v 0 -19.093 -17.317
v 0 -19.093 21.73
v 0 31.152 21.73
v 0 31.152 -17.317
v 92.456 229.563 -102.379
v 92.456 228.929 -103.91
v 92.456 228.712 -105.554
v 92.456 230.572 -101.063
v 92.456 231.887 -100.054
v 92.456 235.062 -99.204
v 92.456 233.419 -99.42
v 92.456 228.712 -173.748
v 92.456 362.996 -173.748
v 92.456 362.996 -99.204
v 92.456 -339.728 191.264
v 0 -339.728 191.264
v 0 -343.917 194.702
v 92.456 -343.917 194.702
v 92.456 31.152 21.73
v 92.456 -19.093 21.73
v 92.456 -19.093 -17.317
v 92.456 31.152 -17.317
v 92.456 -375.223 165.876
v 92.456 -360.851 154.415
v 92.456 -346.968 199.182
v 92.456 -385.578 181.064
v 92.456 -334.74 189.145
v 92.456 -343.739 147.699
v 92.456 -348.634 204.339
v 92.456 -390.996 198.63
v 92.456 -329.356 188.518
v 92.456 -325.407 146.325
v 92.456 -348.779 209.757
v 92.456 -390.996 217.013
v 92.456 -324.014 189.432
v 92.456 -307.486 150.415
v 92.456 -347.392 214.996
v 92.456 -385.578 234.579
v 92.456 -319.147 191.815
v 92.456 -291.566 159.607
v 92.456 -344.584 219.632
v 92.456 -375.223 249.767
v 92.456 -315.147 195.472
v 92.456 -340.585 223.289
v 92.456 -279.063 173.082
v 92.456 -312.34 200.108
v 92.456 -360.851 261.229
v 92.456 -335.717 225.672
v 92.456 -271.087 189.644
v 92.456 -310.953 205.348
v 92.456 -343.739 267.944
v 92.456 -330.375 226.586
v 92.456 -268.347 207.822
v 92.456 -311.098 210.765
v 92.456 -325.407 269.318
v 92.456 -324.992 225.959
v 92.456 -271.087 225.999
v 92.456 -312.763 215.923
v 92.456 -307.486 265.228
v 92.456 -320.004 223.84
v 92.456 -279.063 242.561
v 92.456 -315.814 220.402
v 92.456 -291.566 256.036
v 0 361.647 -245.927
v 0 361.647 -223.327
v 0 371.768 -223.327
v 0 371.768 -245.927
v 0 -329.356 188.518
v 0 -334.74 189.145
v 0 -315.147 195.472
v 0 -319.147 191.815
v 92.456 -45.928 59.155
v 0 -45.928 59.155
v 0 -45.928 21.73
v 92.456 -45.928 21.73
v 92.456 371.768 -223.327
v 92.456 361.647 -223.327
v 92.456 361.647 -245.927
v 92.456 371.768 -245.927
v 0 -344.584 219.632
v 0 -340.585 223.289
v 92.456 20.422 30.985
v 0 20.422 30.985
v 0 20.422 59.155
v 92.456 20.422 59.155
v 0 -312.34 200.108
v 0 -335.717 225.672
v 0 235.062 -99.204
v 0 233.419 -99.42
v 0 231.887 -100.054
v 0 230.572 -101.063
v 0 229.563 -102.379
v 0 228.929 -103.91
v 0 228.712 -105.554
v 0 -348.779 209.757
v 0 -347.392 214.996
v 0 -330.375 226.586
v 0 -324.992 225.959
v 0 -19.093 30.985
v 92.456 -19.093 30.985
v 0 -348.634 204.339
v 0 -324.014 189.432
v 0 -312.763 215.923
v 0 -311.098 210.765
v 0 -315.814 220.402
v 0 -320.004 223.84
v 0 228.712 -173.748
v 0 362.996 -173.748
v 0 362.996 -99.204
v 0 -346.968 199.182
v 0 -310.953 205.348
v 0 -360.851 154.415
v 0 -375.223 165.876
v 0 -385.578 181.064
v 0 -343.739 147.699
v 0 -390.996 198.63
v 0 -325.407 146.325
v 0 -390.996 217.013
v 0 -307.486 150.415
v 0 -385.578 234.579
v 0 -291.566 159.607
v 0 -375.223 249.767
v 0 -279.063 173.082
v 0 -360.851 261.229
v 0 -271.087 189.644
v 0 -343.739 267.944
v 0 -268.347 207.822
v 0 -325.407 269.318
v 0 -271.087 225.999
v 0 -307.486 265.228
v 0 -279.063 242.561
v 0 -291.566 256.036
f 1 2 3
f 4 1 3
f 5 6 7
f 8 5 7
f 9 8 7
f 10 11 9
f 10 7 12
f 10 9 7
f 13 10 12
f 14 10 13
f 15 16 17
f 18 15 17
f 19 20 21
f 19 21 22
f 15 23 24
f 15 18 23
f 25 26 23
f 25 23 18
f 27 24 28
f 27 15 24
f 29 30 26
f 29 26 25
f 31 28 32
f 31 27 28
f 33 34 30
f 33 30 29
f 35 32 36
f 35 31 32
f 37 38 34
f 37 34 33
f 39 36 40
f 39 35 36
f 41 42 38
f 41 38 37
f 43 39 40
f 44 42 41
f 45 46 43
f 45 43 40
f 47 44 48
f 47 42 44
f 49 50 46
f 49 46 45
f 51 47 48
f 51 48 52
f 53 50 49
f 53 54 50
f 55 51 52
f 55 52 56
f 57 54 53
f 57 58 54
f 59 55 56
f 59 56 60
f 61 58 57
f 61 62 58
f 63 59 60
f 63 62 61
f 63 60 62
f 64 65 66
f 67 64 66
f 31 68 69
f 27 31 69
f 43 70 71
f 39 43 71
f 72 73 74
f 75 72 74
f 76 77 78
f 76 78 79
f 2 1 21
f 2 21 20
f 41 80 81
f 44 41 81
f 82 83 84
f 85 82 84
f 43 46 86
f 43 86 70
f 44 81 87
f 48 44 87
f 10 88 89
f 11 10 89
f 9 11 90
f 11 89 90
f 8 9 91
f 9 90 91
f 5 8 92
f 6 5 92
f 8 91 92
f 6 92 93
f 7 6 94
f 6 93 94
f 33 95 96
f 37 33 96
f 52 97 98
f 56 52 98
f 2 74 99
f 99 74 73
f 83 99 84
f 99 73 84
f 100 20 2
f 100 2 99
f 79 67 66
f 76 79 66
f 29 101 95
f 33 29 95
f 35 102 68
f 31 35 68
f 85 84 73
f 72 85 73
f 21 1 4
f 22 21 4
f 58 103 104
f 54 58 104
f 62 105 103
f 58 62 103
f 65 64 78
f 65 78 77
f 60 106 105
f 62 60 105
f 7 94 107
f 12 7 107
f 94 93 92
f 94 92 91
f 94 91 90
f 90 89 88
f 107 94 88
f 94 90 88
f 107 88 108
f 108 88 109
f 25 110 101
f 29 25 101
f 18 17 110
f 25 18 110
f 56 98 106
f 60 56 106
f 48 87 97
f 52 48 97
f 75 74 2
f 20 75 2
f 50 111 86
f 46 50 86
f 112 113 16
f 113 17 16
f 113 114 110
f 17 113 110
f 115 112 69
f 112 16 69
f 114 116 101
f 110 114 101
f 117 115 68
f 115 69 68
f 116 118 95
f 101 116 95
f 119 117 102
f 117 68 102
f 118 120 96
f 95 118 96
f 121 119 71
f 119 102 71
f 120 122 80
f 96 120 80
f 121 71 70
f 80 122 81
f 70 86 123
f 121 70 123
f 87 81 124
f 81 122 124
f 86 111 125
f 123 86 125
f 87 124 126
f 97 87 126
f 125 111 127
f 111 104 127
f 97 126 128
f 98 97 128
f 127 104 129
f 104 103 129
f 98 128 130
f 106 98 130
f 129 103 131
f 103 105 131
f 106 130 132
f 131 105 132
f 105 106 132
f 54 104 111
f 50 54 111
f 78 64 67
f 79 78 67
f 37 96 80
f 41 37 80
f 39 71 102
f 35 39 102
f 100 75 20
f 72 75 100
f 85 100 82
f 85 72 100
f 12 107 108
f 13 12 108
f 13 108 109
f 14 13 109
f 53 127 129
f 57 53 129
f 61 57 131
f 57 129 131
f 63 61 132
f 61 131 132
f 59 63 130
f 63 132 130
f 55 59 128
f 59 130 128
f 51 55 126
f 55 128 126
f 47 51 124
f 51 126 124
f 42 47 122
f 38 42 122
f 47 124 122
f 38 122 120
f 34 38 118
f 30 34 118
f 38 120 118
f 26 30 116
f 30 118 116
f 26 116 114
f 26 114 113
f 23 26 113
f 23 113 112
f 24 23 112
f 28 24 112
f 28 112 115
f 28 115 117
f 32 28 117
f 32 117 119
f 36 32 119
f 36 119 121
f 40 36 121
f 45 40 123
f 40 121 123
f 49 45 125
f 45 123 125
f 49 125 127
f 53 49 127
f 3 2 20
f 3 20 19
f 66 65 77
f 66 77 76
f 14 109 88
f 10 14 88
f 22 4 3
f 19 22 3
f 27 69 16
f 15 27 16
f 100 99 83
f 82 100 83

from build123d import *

# Parameters (mm, degrees)
F0_W     = 50.2453520894
F0_H     = 39.0470791608
F1_DEPTH = 92.456
F0_W_2   = 26.8350038677
F0_H_2   = 9.2546753585
F0_W_3   = 39.5157057792
F0_H_3   = 28.1695313752
F0_W_4   = 3.8517713547
F0_H_4   = 74.5441019535
F0_W_5   = 10.1218819618
F0_H_5   = 22.6000696421
F0_R     = 61.6690599932


with BuildPart() as f1:
    # F0 (on Right) → F1 (new body)
    with BuildSketch(Plane.YZ):
        with Locations((6.0294363648, 2.2069280967)):
            Rectangle(F0_W, F0_H)
    extrude(amount=F1_DEPTH)


with BuildPart() as f1b:
    # F0 (on Right) → F1, piece 2 (new body)
    with BuildSketch(Plane.YZ):
        with Locations((-32.5107416138, 26.3578053564)):
            Rectangle(F0_W_2, F0_H_2)
        with Locations((0.6646132097, 45.0699087232)):
            Rectangle(F0_W_3, F0_H_3)
        with Locations((-32.5107416138, 45.0699087232)):
            Rectangle(F0_W_2, F0_H_3)
    extrude(amount=F1_DEPTH)


with BuildPart() as f1c:
    # F0 (on Right) → F1, piece 3 (new body)
    with BuildSketch(Plane.YZ):
        with Locations((361.0702455044, -136.4756524563)):
            Rectangle(F0_W_4, F0_H_4)
        with BuildLine():
            Line((228.7123948336, -173.747703433), (359.144359827, -173.747703433))
            Line((359.144359827, -173.747703433), (359.144359827, -99.2036014795))
            Line((359.144359827, -99.2036014795), (235.0623948336, -99.2036014795))
            ThreePointArc((235.0623948336, -99.2036014795), (230.572266773, -101.063473419), (228.7123948336, -105.5536014795))
            Line((228.7123948336, -105.5536014795), (228.7123948336, -173.747703433))
        make_face()
    extrude(amount=F1_DEPTH)


with BuildPart() as f1d:
    # F0 (on Right) → F1, piece 4 (new body)
    with BuildSketch(Plane.YZ):
        with Locations((366.7074739933, -234.6265390515)):
            Rectangle(F0_W_5, F0_H_5)
    extrude(amount=F1_DEPTH)


with BuildPart() as f1e:
    # F0 (on Right) → F1, piece 5 (new body)
    with BuildSketch(Plane.YZ):
        with Locations((-330.0160169601, 207.8216075897)):
            Circle(F0_R)
        Polygon((-348.6337553052, 204.3390901534), (-348.7787469344, 209.7568042641), (-347.3915189352, 214.9959117489), (-344.5844562699, 219.6319712773), (-340.5849704614, 223.2893968782), (-335.7170760642, 225.671885681), (-330.3751409316, 226.5864226119), (-324.9919368786, 225.9589173279), (-320.0035790823, 223.8402065751), (-315.8141946244, 220.4019356983), (-312.7631825185, 215.9226529557), (-311.0977176204, 210.7652431959), (-310.9527259912, 205.3475290851), (-312.3399539904, 200.1084216004), (-315.1470166557, 195.4723620719), (-319.1465024641, 191.814936471), (-324.0143968614, 189.4324476683), (-329.3563319939, 188.5179107373), (-334.739536047, 189.1454160213), (-339.7278938433, 191.2641267741), (-343.9172783012, 194.7023976509), (-346.9682904071, 199.1816803935), align=None, mode=Mode.SUBTRACT)
    extrude(amount=F1_DEPTH)


solid = Compound([f1.part, f1b.part, f1c.part, f1d.part, f1e.part])
